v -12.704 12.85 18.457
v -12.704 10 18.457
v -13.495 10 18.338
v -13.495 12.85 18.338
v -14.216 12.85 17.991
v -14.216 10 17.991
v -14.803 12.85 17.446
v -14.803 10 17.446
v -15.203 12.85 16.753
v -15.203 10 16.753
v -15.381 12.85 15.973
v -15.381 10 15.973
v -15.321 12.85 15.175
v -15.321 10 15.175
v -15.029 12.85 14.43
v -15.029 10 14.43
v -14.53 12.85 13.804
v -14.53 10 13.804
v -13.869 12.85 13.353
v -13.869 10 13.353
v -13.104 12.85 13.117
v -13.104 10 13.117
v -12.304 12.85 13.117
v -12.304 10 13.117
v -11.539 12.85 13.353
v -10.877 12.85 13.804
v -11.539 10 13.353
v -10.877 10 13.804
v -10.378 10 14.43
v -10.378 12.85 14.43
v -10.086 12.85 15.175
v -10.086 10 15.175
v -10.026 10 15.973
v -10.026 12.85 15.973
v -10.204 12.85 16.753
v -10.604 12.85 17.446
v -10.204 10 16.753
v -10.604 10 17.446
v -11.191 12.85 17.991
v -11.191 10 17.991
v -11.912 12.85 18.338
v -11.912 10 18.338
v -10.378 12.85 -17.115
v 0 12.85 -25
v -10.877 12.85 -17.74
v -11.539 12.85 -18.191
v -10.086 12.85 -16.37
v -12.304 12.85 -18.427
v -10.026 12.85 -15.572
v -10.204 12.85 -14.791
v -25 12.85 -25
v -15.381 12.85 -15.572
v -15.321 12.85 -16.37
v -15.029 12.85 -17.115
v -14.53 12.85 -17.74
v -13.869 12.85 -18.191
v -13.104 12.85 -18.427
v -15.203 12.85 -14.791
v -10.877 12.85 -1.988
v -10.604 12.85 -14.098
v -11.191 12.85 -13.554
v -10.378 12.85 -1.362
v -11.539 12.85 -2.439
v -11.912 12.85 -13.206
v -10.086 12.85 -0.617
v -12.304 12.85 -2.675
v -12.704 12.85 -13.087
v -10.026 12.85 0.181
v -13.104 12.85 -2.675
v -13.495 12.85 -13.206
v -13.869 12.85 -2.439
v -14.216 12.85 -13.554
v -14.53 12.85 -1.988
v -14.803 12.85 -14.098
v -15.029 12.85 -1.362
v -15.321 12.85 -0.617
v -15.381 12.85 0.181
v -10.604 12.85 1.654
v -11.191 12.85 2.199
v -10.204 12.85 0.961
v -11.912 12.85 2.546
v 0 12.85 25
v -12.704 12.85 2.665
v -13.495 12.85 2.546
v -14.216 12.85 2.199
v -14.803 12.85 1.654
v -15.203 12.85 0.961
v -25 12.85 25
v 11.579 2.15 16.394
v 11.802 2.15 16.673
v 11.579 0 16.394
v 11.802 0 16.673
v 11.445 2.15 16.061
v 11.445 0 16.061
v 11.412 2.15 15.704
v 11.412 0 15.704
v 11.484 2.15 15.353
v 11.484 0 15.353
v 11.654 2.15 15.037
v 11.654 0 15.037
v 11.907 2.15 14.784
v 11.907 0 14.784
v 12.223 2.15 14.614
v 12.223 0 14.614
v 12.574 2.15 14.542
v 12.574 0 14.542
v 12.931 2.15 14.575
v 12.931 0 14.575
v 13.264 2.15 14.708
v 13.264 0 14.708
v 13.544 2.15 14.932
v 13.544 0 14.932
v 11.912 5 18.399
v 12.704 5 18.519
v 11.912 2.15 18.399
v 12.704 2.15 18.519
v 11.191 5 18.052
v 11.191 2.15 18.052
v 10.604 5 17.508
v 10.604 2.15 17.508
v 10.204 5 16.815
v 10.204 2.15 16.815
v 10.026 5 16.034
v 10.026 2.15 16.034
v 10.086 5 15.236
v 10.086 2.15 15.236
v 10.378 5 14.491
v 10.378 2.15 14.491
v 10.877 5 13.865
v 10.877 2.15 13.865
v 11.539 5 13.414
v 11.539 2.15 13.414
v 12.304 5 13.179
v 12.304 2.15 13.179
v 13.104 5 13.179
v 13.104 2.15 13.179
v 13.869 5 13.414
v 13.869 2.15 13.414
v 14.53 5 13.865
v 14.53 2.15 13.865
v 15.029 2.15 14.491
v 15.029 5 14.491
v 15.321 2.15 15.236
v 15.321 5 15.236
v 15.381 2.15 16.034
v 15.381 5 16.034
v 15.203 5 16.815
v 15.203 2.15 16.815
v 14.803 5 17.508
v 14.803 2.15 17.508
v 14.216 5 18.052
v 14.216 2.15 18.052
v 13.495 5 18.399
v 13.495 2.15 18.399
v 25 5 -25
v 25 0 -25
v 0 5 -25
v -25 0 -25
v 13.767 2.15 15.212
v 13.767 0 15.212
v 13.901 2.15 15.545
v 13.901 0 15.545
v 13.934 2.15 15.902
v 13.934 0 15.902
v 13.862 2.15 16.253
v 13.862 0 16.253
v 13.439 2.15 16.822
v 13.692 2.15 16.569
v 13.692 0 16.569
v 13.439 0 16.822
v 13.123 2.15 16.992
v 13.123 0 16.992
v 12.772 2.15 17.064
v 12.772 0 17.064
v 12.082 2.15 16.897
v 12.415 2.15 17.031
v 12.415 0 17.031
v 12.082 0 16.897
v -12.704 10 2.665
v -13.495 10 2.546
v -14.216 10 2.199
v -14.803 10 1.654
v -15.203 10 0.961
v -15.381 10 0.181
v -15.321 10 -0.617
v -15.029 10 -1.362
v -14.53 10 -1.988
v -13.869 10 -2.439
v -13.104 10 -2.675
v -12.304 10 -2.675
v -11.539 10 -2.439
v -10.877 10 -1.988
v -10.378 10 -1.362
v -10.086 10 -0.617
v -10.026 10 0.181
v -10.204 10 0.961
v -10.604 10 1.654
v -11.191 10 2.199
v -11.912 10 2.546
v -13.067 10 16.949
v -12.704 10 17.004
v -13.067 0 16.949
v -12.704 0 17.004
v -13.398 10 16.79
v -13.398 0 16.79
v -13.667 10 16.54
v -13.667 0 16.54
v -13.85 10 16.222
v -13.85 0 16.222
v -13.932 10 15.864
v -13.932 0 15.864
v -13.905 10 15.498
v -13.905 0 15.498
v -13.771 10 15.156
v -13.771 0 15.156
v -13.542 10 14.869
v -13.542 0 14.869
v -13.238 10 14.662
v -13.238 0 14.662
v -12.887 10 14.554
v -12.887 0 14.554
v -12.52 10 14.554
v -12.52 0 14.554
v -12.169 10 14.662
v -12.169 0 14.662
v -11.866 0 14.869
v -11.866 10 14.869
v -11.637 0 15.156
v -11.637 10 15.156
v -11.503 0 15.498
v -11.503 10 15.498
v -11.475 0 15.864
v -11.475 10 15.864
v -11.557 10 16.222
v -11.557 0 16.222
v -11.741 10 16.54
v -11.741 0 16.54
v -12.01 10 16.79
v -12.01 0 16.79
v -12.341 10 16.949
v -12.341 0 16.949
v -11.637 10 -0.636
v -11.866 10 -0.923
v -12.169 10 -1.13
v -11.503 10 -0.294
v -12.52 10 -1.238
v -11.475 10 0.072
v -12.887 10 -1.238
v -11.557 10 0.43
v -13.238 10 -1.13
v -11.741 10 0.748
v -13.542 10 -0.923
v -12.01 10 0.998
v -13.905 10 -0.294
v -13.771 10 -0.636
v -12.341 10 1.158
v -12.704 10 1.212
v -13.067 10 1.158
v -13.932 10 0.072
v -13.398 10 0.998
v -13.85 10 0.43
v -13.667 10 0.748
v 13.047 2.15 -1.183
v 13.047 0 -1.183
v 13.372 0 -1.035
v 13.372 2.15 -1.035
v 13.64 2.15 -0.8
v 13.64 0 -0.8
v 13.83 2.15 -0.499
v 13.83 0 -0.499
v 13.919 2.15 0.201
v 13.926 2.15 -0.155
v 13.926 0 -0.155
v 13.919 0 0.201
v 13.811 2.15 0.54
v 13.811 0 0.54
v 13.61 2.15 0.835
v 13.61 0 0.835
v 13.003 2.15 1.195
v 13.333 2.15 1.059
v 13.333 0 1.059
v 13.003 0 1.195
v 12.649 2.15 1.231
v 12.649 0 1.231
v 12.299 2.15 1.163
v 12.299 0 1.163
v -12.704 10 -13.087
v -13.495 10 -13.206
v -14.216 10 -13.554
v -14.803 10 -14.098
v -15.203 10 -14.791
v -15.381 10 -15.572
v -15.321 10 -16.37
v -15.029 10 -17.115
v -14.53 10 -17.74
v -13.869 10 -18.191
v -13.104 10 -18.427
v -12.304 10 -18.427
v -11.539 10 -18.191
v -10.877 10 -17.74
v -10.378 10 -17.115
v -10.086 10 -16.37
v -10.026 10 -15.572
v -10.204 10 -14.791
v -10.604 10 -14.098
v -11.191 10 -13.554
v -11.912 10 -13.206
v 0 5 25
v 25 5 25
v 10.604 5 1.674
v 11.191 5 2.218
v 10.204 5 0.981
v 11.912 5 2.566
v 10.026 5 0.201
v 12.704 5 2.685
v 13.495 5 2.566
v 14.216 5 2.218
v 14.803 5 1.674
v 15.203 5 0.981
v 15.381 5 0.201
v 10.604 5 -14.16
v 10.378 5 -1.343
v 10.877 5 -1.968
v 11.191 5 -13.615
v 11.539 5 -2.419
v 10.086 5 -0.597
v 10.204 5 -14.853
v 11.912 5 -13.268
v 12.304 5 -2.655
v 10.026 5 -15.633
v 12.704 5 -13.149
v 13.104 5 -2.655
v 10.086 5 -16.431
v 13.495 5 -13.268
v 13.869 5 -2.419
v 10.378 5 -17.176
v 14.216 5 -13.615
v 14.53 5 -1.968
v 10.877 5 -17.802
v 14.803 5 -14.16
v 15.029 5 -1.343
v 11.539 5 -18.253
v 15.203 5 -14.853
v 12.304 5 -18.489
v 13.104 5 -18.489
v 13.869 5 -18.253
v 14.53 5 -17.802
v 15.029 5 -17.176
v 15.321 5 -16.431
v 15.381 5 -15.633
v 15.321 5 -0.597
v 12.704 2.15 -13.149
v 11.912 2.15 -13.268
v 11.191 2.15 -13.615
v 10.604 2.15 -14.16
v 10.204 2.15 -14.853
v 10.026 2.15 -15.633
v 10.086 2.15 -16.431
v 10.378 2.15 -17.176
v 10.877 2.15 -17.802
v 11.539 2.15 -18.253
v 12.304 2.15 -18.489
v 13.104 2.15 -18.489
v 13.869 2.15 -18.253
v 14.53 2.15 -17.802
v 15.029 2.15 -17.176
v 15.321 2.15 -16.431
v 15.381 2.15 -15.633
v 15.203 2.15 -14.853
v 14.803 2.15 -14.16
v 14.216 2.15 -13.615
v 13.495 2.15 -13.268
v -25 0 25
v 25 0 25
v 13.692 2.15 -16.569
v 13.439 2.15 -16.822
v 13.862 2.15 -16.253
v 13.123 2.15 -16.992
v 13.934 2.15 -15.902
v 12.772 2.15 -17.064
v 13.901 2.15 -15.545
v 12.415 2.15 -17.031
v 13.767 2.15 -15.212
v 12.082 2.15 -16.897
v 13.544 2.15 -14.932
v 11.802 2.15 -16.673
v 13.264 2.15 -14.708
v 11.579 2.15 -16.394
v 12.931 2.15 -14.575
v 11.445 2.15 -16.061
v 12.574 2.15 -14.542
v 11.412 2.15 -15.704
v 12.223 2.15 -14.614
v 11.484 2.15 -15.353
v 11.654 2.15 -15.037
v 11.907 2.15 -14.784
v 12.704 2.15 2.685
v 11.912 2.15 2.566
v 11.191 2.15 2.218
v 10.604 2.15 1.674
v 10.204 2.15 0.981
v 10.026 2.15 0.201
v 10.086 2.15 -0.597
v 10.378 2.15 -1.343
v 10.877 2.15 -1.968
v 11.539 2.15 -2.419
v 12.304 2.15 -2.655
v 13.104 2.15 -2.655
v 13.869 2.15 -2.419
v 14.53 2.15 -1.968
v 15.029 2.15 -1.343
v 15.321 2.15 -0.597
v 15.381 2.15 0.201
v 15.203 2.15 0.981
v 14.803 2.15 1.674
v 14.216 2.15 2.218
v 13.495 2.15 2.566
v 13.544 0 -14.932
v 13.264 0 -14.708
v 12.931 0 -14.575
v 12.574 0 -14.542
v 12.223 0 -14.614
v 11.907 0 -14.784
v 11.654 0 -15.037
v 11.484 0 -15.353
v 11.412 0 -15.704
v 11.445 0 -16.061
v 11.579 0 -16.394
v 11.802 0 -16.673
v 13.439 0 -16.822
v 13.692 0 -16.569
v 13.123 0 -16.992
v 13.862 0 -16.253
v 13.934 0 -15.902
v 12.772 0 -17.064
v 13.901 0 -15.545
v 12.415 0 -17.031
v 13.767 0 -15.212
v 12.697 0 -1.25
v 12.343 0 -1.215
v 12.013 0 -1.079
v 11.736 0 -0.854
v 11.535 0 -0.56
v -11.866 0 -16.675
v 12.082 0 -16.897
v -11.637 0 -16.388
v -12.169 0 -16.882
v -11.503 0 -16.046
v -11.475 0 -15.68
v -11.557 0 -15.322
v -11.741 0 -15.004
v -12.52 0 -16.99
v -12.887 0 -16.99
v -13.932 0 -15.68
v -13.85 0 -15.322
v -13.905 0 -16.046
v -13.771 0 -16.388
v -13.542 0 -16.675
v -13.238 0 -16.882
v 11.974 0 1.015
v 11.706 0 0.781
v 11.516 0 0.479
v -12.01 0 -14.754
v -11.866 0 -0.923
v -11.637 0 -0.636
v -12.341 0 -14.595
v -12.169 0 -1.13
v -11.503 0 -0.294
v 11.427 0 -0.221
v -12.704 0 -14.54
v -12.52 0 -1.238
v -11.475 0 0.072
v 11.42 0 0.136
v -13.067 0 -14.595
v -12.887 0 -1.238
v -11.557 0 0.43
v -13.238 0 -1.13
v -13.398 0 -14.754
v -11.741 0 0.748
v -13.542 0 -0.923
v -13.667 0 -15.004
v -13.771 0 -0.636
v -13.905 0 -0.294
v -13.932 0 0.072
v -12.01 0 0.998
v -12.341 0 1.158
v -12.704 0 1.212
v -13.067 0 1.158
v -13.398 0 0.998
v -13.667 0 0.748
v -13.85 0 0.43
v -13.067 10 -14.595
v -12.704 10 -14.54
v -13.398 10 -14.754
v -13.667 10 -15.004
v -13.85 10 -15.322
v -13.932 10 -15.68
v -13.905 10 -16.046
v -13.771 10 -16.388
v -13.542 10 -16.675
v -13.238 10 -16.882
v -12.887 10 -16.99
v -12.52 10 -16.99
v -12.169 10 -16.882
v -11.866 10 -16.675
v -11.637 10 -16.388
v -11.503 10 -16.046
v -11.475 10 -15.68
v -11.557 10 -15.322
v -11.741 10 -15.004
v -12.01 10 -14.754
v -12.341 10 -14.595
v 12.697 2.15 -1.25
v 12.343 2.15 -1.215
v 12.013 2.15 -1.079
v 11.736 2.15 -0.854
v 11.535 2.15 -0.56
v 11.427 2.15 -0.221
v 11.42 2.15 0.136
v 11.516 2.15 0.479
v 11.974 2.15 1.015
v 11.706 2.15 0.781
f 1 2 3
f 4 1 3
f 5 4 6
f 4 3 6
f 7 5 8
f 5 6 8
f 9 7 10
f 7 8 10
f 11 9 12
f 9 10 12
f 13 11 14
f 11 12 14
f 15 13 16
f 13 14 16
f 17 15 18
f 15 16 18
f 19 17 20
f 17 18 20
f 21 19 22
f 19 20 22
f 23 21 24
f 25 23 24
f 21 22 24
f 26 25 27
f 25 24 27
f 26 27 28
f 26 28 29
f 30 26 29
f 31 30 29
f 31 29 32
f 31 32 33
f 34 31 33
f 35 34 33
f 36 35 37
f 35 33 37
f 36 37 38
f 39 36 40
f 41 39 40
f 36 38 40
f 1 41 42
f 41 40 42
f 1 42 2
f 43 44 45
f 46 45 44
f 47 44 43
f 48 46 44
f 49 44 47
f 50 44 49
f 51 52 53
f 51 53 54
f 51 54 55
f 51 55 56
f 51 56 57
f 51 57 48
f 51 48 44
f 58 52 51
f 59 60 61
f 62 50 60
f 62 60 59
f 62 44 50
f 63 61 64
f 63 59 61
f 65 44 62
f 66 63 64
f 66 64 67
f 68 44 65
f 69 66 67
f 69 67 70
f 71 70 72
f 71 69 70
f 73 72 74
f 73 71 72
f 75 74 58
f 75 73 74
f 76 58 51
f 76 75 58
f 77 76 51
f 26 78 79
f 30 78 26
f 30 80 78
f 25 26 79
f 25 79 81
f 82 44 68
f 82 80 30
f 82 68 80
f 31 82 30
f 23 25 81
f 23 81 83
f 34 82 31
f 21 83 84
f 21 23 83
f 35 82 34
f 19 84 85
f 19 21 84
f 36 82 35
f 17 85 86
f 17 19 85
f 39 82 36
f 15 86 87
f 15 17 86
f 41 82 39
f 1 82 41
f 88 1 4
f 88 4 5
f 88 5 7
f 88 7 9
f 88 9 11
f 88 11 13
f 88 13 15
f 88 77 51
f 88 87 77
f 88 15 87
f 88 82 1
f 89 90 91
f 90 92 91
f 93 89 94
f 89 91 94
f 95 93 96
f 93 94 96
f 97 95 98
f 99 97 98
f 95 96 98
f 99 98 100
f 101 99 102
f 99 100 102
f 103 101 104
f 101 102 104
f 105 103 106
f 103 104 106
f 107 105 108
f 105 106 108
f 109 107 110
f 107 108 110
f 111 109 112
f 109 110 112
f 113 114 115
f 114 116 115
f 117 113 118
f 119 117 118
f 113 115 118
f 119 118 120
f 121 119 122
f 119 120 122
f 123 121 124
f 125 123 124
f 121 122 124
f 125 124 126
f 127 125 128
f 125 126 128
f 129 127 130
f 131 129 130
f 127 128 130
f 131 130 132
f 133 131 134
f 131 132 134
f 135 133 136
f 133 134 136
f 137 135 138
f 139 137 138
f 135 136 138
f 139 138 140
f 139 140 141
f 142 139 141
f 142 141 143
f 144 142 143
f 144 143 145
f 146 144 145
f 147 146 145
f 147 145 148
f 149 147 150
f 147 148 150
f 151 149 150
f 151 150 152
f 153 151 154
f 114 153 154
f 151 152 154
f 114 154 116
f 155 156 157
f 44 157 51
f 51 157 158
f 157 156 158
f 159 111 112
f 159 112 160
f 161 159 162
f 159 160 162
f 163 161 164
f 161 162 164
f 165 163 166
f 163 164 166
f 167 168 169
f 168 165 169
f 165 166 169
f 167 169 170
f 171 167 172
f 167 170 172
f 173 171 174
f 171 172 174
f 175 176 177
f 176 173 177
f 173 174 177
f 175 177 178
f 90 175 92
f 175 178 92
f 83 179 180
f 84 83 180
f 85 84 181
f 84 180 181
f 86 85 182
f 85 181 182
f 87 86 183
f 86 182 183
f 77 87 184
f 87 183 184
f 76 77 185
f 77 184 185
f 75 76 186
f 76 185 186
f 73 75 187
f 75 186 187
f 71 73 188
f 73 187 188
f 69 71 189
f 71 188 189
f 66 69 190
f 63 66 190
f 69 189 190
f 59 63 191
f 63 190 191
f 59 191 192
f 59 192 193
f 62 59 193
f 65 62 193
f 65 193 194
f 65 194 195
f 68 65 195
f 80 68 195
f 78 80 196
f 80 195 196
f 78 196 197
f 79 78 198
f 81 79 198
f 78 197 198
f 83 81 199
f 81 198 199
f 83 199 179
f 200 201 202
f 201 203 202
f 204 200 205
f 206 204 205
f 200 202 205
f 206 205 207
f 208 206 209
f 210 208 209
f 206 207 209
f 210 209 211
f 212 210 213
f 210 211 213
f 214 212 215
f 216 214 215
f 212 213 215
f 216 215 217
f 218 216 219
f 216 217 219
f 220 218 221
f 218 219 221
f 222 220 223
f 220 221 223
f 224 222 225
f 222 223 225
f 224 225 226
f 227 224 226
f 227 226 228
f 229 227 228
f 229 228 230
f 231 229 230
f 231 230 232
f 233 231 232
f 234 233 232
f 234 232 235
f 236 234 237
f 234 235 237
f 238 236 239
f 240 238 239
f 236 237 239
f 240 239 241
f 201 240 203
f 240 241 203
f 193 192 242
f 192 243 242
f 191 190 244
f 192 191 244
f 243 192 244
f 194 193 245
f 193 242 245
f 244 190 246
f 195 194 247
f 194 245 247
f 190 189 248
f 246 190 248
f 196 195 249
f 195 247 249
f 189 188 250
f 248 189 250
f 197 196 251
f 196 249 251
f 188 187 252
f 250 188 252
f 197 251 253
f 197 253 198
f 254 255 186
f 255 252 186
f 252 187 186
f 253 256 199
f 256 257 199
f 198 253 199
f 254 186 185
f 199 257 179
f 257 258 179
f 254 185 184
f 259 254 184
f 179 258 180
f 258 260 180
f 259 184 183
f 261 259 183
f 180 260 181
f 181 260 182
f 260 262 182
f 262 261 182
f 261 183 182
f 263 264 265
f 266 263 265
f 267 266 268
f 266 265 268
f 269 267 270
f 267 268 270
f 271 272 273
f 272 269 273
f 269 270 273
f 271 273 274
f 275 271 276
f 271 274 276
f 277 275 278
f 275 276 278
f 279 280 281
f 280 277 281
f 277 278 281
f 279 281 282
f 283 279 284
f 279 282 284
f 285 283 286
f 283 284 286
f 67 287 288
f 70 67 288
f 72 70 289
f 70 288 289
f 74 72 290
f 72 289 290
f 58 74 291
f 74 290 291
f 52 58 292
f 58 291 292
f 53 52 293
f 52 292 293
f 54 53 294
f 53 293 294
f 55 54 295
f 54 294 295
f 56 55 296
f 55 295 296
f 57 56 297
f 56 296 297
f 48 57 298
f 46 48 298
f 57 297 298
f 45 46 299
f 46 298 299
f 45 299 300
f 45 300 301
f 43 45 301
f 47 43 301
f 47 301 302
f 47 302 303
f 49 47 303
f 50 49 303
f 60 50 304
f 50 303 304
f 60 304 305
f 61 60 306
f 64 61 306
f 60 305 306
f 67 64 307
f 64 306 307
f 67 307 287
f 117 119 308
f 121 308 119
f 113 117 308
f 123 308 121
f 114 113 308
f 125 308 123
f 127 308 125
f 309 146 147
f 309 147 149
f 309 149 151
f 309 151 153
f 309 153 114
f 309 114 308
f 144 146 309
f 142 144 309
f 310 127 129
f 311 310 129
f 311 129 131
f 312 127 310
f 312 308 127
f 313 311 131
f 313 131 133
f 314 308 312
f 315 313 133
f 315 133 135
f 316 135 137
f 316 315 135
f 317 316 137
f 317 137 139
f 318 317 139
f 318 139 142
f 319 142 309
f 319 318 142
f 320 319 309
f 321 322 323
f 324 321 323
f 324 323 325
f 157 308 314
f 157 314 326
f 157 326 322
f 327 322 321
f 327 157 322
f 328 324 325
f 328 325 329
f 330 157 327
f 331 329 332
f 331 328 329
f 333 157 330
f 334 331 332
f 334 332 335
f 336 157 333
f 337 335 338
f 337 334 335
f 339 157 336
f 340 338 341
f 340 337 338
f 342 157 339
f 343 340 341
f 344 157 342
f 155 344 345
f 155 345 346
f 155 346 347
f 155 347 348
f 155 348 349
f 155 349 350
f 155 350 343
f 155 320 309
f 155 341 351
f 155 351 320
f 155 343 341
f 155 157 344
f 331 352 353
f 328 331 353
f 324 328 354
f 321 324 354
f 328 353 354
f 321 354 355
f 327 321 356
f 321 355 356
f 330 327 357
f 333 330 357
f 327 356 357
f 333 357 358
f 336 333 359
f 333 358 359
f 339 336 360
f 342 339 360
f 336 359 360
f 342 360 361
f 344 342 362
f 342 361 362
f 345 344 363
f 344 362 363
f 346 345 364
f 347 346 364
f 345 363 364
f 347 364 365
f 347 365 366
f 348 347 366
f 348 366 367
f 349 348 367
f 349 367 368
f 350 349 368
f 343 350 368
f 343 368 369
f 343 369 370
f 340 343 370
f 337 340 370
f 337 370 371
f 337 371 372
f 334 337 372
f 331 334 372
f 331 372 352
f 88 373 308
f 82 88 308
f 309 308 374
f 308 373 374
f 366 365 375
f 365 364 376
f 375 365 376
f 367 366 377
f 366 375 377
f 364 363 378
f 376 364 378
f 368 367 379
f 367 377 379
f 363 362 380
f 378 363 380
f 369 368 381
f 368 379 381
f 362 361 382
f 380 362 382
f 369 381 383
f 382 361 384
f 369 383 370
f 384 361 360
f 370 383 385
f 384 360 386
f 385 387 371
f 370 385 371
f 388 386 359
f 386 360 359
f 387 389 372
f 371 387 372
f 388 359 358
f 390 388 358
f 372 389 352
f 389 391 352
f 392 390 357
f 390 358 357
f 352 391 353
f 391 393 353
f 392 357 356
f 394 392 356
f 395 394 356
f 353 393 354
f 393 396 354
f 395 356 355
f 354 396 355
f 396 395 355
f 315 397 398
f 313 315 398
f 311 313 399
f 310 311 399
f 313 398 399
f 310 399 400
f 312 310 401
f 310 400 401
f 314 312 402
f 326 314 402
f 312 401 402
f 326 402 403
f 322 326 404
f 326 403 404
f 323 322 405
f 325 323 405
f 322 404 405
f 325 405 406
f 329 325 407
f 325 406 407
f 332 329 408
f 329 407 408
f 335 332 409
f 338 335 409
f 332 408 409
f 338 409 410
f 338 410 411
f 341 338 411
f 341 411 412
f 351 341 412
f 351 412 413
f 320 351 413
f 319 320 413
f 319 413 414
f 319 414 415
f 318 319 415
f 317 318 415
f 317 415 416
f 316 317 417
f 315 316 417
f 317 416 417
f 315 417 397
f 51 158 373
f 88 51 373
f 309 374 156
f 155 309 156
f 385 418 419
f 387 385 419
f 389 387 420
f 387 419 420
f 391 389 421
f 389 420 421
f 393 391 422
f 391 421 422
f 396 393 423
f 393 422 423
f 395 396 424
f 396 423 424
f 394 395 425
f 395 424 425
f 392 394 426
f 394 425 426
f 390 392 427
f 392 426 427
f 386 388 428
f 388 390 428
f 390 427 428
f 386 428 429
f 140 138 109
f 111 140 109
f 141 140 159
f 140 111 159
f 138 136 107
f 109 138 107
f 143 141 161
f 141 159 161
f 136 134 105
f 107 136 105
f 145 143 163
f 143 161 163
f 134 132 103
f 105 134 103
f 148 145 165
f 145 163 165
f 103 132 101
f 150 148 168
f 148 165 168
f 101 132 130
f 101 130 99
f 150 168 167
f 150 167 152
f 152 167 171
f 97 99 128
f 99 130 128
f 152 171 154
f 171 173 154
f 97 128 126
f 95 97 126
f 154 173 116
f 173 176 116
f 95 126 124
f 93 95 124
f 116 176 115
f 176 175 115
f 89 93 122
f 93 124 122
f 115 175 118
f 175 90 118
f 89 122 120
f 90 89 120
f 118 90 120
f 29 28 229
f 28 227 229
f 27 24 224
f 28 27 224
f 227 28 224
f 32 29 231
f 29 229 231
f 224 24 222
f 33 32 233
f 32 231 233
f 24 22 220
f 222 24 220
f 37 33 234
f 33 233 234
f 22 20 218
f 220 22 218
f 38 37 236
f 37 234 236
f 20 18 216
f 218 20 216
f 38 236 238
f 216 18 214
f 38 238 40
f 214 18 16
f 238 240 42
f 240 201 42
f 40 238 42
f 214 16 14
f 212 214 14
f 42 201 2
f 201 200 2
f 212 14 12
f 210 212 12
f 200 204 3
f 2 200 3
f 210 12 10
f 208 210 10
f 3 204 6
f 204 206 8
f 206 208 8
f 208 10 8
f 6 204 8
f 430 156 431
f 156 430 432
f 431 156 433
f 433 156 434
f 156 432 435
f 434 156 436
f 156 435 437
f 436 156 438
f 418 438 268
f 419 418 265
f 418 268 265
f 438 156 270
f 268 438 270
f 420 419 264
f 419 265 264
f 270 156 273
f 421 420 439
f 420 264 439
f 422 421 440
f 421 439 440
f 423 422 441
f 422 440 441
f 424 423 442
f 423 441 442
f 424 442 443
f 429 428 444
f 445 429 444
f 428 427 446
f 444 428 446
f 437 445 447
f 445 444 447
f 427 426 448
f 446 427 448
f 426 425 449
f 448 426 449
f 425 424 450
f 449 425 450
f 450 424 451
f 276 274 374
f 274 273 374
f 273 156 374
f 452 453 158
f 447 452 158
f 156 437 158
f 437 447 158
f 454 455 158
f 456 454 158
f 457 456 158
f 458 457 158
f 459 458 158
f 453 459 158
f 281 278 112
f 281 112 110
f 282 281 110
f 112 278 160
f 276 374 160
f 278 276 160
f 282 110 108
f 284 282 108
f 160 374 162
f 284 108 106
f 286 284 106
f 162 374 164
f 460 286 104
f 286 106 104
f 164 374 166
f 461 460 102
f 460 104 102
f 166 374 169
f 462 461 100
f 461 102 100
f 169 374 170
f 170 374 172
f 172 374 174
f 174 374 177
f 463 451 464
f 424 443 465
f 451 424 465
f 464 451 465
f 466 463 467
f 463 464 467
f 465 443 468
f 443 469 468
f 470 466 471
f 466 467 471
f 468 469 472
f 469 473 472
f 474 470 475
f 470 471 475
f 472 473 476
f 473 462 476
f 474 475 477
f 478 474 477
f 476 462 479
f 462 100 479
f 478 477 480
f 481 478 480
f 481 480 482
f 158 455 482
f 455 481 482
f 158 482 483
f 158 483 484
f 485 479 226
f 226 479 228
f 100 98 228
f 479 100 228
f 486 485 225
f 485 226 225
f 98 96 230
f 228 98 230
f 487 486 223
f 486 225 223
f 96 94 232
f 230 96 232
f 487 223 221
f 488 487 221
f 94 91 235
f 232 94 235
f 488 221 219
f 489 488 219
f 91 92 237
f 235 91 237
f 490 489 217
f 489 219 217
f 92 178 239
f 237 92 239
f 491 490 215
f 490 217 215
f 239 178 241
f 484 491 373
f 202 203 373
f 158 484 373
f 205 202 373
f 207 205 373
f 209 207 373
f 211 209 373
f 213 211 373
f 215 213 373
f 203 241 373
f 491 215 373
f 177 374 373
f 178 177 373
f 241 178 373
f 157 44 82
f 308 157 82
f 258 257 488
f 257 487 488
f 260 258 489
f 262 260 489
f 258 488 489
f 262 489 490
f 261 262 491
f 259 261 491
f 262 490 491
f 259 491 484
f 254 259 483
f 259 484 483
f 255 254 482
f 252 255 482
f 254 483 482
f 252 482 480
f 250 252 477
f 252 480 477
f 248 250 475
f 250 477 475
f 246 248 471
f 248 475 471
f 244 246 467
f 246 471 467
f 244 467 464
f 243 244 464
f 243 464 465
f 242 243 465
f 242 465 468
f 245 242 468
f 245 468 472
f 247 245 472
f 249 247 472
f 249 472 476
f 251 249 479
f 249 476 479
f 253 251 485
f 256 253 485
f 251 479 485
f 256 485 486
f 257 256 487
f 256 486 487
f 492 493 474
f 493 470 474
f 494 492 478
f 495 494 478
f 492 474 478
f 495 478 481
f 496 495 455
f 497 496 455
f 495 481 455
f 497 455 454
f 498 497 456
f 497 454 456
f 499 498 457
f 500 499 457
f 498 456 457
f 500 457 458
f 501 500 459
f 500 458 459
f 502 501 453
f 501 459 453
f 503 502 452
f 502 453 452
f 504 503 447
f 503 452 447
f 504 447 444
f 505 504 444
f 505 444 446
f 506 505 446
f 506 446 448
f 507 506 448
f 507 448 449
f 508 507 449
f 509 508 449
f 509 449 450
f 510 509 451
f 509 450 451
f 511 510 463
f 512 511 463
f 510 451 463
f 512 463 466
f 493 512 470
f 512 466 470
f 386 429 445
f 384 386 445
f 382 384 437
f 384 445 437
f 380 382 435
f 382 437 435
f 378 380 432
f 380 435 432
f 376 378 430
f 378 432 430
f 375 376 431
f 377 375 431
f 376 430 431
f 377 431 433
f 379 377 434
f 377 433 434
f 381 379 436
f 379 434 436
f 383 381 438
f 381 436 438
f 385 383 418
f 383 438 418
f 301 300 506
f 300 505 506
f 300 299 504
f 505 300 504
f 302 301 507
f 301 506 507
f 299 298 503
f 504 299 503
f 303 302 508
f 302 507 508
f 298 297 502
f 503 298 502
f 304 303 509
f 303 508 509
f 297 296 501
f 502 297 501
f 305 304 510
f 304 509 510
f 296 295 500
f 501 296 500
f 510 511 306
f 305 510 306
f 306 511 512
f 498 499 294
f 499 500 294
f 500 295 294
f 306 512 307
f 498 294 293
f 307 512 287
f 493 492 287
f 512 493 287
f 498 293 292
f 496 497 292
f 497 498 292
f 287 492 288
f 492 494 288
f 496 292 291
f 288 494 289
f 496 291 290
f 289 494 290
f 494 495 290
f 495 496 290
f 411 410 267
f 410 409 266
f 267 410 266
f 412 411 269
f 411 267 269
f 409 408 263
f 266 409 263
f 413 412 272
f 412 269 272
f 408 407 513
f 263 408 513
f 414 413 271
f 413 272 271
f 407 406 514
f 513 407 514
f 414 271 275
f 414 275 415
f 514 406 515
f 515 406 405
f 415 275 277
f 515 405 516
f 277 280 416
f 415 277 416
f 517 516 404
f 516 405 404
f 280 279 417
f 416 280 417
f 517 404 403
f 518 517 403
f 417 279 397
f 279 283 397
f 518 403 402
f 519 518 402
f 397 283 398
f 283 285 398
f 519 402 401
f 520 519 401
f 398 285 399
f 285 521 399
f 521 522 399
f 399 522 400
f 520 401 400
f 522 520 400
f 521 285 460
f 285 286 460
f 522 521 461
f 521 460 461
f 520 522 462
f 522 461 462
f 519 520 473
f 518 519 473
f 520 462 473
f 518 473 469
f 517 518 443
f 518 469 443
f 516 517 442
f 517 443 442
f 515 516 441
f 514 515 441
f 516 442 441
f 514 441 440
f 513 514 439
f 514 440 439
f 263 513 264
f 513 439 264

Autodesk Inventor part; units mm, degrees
ref_plane "YZ Plane" through (0, 0, 0) normal (1, 0, 0) x (0, 1, 0)
ref_plane "XZ Plane" through (0, 0, 0) normal (0, 1, 0) x (-1, 0, 0)
ref_plane "XY Plane" through (0, 0, 0) normal (0, 0, 1) x (1, 0, 0)
sketch "Sketch1" plane through (0, 0, 0) normal (0, 1, 0) x (-1, 0, 0)
  line L0 (25, 25) -> (-25, 25)
  line L1 (-25, 25) -> (-25, -25)
  line L2 (-25, -25) -> (25, -25)
  line L3 (25, -25) -> (25, 25)
  line L4 (35, 0) -> (-35, 0) projected
  line L5 (0, -35) -> (0, 35) projected
  point P0 (0, 0)
  dimension "d0" = 50
  dimension "d1" = 50
extrude "Extrusion1" add sketch "Sketch1" along normal blind 12.85
sketch "Sketch2" plane through (0, 12.85, 0) normal (0, 1, 0) x (1, 0, 0)
  line L0 (-25, -25) -> (25, -25) projected
  line L1 (25, -25) -> (25, 25) projected
  line L2 (0, -25) -> (25, -25)
  line L3 (25, -25) -> (25, 25)
  line L4 (25, 25) -> (0, 25)
  line L5 (0, 25) -> (0, -25)
  point P0 (0, 0)
extrude "Extrusion2" cut sketch "Sketch2" against normal blind 7.85
sketch "Sketch3" plane through (0, 12.85, 0) normal (0, 1, 0) x (1, 0, 0)
  line L0 (-25, -25) -> (25, -25) construction
  line L1 (-12.7037, -25) -> (-12.7037, 25.0391) construction
  line L2 (12.6423, -25) -> (12.6423, 25.0391) construction
  line L3 (-35, 0) -> (35, 0) projected
  point P0 (0, 0)
  point P1 (-12.7037, -15.7722)
  point P2 (-12.7037, 0.0196)
  point P3 (-12.7037, 15.7722)
  point P4 (12.6423, -15.7722)
  point P5 (12.6423, 0.0196)
  point P6 (12.6423, 15.7722)
hole "Hole1" at (-12.7037, 12.85, 15.7722) at (-12.7037, 12.85, -0.0196) at (-12.7037, 12.85, -15.7722) at (12.6423, 12.85, 15.7722) at (12.6423, 12.85, -0.0196) at (12.6423, 12.85, -15.7722) direction (0, -1, 0) diameter 2.4638 end through all counterbore diameter 5.37 counterbore depth 2.85
sketch "Sketch4" plane through (0, 5, 0) normal (0, 1, 0) x (1, 0, 0)
  point P0 (0, 0)
  point P1 (12.7037, -15.8336)
  point P2 (12.7037, 0)
  point P3 (12.7037, 15.8336)
hole "Hole2" at (12.7037, 5, 0) at (12.7037, 5, -15.8336) at (12.7037, 5, 15.8336) direction (0, -1, 0) diameter 2.4638 end through all counterbore diameter 5.37 counterbore depth 2.85
properties part number "screwbaserecesed"
